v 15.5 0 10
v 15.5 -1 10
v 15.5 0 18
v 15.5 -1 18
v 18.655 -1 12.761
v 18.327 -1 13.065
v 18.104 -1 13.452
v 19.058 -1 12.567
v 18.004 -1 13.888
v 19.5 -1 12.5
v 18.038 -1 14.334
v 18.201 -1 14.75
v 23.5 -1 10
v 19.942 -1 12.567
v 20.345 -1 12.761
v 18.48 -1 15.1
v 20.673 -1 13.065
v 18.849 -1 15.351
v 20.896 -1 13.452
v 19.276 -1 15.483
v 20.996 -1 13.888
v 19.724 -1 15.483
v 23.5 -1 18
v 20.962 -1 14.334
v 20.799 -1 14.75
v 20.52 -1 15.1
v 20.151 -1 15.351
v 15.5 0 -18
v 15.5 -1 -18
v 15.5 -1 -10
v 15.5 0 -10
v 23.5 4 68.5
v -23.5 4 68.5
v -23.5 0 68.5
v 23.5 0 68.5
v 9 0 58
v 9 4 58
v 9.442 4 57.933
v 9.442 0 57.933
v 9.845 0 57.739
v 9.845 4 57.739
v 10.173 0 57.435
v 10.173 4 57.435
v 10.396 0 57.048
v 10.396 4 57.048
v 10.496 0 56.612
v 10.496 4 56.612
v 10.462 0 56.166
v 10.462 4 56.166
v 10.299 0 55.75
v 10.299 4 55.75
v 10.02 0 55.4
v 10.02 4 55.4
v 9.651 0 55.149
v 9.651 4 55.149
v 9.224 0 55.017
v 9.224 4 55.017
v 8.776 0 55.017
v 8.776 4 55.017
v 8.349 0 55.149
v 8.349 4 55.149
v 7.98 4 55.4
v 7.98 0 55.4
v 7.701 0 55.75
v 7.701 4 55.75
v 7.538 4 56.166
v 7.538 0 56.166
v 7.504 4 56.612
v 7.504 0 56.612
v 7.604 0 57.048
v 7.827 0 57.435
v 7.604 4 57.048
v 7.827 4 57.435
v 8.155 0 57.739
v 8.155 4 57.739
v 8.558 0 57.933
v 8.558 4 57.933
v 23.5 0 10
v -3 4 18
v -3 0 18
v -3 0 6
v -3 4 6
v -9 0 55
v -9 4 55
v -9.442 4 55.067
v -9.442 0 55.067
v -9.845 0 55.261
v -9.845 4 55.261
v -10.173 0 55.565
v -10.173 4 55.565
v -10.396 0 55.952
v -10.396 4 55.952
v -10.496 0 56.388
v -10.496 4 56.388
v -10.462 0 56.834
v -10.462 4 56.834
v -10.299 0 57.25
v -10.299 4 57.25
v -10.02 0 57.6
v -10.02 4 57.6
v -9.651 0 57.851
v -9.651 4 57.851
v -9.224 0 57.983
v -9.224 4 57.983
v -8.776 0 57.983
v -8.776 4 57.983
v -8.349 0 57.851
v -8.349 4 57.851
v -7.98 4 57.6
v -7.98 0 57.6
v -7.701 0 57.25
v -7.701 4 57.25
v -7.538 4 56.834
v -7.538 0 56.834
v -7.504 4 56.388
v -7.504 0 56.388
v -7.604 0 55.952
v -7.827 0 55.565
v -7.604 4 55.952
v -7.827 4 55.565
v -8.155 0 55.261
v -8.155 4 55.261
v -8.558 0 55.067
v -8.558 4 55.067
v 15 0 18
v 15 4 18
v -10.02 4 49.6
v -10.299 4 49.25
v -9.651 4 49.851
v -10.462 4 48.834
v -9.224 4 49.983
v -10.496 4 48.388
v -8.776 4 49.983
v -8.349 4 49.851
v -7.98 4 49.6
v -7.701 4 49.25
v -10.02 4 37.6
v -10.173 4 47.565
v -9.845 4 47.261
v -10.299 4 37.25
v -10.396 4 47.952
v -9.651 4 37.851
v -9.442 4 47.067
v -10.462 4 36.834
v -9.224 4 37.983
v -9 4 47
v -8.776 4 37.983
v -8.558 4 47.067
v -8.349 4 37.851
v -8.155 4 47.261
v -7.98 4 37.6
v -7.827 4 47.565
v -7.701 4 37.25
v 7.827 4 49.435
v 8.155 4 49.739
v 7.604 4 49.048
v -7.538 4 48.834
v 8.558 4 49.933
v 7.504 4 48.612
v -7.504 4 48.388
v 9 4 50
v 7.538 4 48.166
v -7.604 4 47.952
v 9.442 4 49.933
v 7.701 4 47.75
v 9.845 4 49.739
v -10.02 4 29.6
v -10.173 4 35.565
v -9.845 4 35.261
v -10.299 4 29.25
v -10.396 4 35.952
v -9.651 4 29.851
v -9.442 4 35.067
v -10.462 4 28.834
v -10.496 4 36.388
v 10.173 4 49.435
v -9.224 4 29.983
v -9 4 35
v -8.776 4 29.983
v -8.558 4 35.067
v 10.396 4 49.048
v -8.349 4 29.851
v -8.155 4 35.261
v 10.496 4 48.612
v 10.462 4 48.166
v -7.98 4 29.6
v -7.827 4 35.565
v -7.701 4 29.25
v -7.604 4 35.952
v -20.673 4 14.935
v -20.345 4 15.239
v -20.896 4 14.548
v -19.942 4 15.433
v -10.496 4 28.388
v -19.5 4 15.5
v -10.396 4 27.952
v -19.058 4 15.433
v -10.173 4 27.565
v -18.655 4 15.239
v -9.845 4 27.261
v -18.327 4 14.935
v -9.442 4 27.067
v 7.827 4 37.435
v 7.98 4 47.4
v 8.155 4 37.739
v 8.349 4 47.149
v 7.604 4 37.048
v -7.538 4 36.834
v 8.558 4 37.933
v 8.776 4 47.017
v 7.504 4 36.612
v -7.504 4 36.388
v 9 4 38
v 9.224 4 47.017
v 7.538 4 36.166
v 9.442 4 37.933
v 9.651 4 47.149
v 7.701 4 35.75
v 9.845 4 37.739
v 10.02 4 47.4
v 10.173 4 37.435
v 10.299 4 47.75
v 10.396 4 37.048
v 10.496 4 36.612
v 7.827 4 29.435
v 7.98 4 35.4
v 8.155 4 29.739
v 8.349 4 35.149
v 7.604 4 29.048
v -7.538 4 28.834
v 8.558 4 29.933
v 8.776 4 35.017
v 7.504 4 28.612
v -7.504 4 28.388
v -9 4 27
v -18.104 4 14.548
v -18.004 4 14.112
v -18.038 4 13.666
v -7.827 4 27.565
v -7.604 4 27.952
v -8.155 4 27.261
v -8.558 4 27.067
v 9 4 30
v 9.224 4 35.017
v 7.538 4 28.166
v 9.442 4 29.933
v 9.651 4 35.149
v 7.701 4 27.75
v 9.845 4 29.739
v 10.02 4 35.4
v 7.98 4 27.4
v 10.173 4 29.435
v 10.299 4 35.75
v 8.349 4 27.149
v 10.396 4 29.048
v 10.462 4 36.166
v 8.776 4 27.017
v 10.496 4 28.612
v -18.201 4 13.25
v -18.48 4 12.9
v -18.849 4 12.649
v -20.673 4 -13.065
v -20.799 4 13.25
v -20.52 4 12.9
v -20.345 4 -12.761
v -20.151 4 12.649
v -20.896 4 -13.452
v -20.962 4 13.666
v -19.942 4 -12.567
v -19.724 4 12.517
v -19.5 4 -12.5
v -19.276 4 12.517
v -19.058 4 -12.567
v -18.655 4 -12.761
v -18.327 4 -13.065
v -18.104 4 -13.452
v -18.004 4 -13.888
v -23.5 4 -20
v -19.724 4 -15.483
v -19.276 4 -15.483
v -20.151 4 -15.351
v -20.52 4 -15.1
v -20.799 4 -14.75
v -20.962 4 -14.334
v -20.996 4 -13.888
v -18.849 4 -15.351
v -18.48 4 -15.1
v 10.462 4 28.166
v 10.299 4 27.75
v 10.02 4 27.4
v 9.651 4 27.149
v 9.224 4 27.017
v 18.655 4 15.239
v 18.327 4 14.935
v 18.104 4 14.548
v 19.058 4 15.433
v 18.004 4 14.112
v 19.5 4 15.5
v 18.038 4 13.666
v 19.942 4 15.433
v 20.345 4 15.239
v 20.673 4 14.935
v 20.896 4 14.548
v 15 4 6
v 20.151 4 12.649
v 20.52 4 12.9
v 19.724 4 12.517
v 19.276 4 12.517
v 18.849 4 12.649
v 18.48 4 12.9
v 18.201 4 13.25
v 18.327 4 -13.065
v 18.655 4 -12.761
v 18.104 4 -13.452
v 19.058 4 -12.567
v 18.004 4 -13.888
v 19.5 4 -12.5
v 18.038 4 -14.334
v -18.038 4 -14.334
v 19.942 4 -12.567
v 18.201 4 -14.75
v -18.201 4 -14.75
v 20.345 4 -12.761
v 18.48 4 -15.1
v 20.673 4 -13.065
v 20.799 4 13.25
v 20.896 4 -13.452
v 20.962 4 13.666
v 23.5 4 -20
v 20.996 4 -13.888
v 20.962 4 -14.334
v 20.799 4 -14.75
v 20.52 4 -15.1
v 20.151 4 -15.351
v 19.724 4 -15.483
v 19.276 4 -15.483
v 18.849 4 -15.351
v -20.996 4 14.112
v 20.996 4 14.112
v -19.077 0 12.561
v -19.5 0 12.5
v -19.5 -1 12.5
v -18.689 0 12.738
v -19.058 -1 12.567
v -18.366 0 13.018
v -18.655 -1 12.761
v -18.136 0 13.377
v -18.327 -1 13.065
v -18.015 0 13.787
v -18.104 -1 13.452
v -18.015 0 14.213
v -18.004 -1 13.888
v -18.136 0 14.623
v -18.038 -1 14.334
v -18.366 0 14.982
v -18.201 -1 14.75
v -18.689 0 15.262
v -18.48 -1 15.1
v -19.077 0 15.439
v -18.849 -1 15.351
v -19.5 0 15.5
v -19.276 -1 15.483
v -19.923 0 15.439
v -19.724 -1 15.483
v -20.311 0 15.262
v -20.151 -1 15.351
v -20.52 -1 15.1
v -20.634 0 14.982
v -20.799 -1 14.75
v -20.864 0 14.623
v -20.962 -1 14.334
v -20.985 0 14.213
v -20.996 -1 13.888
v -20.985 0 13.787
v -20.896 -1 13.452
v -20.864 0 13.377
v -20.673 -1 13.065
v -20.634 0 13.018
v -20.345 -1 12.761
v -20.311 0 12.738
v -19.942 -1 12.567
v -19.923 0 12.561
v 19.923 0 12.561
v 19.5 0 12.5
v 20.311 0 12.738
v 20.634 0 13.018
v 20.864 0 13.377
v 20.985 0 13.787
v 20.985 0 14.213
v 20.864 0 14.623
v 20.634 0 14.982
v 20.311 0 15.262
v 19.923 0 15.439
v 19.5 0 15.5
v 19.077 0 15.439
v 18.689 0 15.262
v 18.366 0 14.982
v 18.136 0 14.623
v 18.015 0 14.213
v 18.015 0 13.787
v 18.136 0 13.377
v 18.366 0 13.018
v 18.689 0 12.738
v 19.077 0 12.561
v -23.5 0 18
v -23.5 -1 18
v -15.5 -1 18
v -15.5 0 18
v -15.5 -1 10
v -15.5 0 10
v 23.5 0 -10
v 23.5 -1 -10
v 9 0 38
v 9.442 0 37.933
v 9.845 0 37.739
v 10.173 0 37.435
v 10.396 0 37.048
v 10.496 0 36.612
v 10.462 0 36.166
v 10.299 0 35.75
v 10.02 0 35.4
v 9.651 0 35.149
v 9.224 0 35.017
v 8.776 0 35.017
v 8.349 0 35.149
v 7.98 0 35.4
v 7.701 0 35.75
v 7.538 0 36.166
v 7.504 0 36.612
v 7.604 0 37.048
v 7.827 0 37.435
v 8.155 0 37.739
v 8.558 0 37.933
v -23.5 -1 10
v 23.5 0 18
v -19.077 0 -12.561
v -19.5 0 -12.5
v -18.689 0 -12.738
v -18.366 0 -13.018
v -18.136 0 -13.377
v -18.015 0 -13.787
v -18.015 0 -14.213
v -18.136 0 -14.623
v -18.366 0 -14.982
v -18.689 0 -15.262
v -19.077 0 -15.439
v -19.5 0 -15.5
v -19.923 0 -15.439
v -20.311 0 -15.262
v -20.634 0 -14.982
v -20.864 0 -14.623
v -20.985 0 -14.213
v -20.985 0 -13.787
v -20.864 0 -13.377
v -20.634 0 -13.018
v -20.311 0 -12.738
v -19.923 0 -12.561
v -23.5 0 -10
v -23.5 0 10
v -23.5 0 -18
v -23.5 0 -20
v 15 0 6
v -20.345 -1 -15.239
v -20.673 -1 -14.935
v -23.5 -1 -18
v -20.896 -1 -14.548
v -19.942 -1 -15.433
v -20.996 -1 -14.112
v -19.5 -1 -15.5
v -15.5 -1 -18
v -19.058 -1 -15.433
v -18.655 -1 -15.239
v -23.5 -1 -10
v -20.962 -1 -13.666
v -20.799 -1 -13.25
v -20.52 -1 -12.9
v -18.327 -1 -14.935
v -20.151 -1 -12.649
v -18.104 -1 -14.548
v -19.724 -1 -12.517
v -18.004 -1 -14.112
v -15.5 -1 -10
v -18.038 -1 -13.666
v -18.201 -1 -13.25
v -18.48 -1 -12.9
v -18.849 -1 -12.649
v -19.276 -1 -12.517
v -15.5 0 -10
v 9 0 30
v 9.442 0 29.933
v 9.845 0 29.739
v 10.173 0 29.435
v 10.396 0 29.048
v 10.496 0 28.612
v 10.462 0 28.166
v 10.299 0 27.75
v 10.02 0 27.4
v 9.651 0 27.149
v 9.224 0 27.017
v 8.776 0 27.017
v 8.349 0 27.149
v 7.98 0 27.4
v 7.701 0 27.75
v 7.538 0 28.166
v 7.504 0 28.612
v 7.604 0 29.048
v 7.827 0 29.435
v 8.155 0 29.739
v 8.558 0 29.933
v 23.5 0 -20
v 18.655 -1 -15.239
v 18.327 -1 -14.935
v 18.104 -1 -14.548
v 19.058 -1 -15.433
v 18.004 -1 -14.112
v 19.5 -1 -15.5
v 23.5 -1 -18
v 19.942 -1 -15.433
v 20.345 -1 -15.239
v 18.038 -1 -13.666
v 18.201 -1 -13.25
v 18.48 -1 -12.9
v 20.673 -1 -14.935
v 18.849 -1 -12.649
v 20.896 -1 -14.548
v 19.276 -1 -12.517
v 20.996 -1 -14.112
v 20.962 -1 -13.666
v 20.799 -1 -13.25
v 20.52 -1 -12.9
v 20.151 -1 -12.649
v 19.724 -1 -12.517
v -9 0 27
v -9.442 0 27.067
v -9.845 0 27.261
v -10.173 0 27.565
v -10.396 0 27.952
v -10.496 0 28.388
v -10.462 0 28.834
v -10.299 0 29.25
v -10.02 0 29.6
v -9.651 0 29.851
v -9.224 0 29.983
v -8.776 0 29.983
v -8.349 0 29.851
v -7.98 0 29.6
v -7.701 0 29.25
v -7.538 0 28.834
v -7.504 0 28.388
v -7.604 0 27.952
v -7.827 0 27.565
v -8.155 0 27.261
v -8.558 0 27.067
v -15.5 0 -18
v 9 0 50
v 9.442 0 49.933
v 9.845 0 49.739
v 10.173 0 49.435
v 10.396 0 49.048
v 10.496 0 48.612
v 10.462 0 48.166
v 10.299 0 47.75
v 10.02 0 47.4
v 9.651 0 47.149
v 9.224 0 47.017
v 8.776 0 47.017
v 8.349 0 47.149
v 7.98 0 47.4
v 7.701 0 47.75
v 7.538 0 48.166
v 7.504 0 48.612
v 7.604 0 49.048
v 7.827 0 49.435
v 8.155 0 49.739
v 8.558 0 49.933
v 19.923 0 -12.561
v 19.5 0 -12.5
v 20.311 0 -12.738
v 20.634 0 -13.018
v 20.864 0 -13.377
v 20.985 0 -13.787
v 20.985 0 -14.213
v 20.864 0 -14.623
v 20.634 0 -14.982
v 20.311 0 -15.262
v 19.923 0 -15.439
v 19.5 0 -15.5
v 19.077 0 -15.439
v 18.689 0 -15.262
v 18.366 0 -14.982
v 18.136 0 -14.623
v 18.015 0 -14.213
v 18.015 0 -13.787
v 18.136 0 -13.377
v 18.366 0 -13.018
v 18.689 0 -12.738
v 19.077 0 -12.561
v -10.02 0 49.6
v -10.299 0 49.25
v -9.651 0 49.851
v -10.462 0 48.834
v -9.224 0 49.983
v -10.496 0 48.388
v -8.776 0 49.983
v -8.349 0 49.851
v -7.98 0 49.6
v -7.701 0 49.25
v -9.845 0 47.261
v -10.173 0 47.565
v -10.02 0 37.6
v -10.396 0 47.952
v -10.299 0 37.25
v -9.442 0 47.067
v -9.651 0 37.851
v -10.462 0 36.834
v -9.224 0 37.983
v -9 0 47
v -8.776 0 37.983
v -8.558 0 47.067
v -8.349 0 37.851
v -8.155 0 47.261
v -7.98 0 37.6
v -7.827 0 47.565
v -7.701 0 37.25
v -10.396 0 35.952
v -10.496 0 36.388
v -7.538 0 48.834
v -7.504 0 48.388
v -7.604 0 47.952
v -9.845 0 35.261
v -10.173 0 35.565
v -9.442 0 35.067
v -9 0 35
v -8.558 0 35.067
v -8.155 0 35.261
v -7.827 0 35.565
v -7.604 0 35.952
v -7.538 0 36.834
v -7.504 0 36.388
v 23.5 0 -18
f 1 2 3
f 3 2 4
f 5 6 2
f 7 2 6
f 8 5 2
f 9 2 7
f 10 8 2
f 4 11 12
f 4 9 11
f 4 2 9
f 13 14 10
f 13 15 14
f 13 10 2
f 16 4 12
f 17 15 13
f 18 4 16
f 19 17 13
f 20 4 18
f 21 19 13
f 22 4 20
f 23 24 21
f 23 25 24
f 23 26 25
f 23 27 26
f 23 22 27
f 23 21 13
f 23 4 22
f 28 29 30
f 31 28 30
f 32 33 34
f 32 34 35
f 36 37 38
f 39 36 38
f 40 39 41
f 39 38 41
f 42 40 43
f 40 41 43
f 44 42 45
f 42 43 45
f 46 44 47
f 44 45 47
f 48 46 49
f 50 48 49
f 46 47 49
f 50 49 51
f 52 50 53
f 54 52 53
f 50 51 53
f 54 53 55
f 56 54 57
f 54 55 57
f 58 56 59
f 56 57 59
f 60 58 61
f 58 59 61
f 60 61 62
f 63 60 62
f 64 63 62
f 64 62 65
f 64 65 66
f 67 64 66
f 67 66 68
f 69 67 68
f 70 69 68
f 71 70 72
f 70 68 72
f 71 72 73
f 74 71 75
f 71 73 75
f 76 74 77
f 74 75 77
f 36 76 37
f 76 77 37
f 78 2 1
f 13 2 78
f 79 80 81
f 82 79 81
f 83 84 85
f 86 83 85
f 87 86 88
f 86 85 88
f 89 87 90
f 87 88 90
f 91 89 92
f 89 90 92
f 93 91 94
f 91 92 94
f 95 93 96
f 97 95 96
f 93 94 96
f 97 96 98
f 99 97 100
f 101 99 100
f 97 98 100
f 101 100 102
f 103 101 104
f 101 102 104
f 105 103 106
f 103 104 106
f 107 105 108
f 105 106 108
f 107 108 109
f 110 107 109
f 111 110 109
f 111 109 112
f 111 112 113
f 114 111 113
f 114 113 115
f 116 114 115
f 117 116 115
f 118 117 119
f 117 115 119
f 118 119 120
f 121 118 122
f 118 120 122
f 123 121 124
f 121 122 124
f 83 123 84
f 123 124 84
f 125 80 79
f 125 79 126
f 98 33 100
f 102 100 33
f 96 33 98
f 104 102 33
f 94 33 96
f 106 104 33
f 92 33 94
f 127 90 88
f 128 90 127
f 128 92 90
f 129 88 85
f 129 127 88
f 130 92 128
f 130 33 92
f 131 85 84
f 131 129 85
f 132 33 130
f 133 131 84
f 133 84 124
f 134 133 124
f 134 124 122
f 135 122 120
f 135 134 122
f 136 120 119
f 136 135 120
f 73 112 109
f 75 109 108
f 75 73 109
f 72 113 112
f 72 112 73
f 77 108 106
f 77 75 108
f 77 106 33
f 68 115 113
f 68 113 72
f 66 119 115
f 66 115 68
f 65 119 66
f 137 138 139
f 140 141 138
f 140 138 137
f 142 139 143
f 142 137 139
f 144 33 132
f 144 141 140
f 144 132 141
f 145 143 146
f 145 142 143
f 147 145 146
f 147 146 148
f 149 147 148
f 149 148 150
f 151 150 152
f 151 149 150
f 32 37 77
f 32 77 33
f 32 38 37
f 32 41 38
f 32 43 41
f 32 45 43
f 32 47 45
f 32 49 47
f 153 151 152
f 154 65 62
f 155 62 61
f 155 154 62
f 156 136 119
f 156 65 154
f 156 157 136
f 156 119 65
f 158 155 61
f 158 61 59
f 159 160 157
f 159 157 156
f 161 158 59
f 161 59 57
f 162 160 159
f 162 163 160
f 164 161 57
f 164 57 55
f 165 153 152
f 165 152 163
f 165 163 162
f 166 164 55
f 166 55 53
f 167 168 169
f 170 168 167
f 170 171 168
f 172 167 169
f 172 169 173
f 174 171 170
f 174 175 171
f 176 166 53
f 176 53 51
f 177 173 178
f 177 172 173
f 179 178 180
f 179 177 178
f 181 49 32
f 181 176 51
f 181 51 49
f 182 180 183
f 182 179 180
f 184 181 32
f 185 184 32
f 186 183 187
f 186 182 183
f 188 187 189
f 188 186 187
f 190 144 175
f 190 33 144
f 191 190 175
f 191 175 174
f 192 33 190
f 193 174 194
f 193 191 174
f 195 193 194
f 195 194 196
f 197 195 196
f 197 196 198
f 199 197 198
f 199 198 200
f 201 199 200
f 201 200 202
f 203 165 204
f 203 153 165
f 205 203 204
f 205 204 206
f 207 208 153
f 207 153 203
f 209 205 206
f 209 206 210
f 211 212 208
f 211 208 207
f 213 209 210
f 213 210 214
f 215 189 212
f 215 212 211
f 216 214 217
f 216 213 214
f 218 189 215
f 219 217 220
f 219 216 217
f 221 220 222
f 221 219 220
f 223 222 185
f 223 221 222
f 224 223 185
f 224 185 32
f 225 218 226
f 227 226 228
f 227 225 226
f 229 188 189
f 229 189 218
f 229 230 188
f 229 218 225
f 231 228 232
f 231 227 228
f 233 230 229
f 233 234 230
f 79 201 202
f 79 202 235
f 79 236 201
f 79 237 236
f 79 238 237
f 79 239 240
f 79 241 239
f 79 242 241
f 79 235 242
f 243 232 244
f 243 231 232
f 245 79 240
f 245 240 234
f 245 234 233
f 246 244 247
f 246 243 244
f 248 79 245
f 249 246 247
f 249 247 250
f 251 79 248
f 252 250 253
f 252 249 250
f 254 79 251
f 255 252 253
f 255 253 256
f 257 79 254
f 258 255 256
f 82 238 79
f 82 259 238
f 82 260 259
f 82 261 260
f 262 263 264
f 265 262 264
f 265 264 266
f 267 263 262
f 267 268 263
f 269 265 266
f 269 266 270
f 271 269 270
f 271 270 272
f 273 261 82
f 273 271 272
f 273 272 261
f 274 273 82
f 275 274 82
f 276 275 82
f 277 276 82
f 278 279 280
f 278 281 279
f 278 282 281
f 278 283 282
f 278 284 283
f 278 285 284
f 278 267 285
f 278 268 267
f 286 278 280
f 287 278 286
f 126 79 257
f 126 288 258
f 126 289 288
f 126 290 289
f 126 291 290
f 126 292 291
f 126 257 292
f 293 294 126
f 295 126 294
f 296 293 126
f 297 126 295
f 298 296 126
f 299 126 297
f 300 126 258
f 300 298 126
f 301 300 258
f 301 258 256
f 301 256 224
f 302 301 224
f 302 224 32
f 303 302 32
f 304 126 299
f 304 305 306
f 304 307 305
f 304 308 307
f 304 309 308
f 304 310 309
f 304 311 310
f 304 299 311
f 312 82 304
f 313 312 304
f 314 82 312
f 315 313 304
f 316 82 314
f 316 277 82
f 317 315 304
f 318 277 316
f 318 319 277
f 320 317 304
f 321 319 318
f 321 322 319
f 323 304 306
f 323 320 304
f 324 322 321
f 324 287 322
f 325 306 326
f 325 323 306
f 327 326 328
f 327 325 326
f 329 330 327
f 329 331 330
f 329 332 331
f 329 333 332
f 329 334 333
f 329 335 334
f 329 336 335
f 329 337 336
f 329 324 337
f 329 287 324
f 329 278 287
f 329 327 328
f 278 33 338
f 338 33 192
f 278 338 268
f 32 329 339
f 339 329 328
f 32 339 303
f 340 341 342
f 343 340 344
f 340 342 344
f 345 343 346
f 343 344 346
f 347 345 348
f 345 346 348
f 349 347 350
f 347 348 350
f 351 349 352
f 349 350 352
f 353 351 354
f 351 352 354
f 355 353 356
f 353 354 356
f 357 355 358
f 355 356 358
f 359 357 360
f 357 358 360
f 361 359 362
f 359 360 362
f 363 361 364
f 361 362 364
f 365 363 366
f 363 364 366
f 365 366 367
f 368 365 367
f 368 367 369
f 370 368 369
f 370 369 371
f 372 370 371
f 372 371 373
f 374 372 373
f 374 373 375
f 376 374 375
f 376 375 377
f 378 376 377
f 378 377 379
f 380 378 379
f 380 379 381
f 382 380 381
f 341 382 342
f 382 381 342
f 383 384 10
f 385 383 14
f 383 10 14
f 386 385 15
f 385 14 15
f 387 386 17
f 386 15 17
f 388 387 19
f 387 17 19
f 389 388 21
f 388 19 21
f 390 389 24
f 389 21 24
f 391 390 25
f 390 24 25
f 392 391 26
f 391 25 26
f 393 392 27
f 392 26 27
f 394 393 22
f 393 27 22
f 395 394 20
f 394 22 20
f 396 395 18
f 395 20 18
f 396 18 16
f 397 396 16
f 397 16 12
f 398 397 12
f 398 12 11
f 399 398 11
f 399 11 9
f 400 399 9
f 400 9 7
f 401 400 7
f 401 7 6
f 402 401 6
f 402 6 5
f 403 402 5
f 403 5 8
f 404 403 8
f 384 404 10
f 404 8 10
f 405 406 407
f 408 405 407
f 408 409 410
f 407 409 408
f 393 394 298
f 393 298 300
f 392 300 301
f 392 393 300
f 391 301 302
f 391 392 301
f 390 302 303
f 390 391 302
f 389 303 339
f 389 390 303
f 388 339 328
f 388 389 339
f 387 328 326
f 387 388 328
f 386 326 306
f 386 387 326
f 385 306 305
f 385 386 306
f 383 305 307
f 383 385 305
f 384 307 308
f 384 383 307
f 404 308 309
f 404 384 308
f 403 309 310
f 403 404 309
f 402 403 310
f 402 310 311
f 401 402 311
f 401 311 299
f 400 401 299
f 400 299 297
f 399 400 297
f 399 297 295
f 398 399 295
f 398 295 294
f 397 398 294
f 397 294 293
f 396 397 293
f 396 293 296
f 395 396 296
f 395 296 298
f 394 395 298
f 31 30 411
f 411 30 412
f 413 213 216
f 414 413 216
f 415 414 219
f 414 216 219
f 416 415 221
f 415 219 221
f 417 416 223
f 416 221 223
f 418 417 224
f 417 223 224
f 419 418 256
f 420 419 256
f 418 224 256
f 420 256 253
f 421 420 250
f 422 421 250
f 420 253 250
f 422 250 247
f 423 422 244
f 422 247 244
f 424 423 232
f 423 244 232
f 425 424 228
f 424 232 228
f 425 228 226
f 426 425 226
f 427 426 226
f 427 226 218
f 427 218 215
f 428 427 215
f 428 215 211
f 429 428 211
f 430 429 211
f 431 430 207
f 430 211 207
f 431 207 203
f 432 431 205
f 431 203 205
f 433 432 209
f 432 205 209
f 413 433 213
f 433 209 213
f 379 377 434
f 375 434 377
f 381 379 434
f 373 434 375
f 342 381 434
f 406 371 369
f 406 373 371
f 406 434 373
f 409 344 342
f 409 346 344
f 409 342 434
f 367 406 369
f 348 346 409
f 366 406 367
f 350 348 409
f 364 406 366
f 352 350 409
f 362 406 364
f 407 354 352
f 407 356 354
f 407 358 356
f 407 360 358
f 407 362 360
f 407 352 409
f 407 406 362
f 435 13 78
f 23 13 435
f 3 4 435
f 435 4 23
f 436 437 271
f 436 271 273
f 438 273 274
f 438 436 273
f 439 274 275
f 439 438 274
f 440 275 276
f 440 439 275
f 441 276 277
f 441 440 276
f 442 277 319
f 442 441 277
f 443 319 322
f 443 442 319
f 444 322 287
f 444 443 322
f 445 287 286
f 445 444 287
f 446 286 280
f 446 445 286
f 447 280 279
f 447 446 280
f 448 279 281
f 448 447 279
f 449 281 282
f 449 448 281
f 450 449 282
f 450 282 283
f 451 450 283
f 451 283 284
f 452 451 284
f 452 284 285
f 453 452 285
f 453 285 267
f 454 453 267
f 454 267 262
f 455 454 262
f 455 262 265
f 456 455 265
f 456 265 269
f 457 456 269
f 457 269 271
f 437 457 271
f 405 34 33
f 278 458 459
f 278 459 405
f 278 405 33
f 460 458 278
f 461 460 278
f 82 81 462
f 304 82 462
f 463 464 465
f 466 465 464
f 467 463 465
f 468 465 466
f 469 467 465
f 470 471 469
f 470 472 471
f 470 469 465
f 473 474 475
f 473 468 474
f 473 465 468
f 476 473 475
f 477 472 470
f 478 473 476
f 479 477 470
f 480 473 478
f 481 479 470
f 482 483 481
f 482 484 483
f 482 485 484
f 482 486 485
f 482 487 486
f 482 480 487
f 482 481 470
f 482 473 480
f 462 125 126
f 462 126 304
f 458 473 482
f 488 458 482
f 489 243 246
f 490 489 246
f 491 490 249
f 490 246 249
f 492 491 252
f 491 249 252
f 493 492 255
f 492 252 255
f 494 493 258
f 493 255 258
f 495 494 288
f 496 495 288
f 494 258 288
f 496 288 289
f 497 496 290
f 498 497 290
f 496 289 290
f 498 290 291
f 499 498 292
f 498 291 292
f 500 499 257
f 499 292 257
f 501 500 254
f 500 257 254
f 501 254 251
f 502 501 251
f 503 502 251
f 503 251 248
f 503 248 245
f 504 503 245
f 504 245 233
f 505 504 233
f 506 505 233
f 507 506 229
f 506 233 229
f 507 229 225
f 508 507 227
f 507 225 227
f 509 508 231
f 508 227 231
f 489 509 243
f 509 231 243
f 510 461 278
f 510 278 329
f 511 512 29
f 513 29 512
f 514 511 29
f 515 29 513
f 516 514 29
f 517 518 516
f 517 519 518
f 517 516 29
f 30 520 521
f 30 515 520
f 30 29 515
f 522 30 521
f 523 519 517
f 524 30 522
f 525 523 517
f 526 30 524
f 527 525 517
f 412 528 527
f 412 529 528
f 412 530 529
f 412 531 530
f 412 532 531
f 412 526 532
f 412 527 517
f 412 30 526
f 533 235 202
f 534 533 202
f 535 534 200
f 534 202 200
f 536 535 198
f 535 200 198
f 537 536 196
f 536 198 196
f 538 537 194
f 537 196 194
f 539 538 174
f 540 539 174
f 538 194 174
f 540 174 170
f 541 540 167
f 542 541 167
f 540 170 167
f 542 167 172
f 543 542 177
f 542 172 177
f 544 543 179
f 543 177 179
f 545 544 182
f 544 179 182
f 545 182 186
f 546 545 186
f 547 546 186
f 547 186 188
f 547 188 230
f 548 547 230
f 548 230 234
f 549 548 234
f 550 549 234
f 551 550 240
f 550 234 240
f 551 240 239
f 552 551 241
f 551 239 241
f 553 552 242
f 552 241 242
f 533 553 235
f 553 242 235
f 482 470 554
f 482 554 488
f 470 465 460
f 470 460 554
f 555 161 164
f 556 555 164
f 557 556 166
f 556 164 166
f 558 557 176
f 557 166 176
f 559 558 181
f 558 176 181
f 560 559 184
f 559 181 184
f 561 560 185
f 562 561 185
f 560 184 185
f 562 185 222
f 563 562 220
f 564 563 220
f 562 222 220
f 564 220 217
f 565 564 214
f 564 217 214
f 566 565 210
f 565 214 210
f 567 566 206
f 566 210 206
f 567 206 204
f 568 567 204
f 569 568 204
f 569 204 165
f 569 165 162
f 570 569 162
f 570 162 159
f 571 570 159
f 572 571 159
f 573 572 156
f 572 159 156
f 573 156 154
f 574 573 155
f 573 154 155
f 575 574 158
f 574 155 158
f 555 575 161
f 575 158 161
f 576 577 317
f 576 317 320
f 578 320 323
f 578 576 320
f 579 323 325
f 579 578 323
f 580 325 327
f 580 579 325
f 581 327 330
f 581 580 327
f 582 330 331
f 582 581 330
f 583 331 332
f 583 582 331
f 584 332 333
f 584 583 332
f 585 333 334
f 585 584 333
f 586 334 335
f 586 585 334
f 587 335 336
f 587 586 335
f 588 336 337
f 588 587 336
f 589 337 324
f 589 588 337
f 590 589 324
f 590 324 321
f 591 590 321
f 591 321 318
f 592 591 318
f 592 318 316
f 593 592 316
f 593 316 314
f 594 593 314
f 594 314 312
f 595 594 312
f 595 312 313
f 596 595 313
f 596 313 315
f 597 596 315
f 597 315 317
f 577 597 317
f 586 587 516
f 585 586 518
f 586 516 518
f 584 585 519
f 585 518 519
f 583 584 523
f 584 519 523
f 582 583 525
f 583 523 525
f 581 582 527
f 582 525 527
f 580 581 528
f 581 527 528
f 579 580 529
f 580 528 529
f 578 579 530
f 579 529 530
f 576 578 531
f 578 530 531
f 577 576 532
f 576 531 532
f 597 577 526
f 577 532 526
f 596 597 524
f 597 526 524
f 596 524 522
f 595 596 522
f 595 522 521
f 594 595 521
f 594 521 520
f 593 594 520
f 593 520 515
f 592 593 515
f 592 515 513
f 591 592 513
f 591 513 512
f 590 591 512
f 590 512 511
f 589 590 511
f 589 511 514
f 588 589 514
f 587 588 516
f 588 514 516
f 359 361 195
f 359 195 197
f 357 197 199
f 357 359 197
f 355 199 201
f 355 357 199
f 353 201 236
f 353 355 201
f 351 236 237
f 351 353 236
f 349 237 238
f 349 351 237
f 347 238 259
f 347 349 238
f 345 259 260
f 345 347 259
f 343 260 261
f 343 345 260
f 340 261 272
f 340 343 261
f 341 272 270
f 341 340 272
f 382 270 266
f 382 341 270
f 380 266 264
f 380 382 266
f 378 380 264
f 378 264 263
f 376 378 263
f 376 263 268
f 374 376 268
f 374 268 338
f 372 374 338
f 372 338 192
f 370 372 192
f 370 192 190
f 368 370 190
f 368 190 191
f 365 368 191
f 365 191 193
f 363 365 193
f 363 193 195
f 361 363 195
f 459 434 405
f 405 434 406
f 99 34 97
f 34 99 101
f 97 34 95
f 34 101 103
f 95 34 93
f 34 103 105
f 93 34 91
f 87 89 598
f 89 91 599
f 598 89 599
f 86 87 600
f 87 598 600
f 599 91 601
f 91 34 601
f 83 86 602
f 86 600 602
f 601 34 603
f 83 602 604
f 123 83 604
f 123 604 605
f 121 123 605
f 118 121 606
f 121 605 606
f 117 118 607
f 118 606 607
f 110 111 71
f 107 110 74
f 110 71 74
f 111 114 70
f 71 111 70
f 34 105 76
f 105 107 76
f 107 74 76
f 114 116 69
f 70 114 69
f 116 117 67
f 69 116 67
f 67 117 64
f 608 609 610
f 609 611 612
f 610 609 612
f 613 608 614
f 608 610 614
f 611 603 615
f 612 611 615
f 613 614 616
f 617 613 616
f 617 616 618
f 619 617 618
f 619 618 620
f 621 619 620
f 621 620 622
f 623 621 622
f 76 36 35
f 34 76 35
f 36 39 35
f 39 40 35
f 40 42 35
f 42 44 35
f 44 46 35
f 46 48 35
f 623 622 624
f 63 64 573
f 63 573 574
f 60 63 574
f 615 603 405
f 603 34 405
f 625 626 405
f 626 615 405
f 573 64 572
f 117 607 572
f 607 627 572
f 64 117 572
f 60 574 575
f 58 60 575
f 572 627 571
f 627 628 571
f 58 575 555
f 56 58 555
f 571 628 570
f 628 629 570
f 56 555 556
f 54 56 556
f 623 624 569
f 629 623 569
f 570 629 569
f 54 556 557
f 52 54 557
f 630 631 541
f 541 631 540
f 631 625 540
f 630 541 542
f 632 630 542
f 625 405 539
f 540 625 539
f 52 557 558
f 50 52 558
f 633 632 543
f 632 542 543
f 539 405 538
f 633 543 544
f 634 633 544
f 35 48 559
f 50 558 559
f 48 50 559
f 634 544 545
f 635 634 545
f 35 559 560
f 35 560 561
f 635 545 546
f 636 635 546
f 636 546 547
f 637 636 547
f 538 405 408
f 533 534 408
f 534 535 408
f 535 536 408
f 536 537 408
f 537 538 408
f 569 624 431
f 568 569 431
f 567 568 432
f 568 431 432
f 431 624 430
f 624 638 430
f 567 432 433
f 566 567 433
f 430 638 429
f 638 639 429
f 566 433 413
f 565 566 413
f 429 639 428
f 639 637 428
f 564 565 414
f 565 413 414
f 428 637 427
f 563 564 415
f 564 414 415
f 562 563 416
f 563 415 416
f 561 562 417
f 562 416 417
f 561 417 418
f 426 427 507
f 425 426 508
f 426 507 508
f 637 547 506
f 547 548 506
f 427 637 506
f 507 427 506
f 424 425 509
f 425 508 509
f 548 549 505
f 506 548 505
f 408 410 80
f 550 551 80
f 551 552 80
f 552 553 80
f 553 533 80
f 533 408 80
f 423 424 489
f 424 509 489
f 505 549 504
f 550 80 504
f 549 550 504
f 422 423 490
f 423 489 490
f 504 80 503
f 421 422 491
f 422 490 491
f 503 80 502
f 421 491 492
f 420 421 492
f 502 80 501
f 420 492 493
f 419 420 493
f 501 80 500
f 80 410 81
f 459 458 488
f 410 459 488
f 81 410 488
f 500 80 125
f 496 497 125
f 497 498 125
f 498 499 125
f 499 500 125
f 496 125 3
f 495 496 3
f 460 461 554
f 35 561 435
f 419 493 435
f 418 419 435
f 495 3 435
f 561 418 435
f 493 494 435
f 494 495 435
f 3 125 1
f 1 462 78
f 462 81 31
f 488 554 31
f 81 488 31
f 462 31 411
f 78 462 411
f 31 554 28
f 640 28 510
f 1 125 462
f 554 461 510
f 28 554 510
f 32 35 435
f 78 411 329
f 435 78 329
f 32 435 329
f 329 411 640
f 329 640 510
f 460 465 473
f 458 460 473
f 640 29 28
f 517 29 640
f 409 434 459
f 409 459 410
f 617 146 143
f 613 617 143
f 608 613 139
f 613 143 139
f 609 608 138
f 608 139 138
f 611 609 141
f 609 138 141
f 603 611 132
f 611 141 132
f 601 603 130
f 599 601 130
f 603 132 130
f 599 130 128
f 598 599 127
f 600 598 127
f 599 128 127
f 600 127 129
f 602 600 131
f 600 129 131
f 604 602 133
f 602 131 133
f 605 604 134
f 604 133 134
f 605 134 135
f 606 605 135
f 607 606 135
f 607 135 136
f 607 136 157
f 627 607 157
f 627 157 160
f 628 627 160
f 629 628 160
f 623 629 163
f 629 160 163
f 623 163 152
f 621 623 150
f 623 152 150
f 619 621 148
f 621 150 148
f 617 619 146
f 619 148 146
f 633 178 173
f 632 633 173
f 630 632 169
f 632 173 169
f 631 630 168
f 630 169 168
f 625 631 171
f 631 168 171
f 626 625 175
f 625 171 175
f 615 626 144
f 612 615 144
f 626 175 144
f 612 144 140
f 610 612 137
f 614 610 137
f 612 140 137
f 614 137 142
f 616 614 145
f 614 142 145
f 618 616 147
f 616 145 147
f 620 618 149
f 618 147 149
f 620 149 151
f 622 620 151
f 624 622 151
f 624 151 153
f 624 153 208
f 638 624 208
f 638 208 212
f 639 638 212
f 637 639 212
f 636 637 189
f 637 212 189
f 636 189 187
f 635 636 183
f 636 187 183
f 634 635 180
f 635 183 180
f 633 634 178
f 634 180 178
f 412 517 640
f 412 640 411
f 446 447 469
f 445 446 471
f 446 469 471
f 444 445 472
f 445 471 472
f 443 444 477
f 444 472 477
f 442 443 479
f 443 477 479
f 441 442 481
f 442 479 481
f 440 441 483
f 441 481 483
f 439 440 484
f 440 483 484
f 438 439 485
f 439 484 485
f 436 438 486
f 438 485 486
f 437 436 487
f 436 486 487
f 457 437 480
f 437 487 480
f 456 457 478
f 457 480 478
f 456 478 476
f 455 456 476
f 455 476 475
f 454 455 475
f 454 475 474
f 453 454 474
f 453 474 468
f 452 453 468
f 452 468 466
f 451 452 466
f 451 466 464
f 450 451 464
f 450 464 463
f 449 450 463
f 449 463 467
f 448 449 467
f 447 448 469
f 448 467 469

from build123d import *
from build123d.topology import SkipClean

# Parameters (mm, degrees)
SKETCH_1_W          = 47
SKETCH_1_H          = 93.5
SKETCH_1_R          = 1.5
SKETCH_1_W_2        = 18
SKETCH_1_H_2        = 12
EXTRUDE_1_DEPTH     = 4
EXTRUDE_START       = 1
SKETCH_3_W          = 8
SKETCH_3_H          = 8
SKETCH_3_R          = 1.5
EXTRUDE_2_DEPTH     = 1
SKETCH_4_R          = 1.5
SKETCH_4_W          = 47
SKETCH_4_H          = 5
CUT_EXTRUDE_2_DEPTH = 4


with BuildPart() as part:
    # 草图1 → 凸台-拉伸1 (new body)
    with BuildSketch(Plane(origin=(0, 0, 0), x_dir=(1, 0, 0), z_dir=(0, 1, 0))):
        with Locations((0, -26.75)):
            Rectangle(SKETCH_1_W, SKETCH_1_H)
        with Locations(Location((-19.5, -14, 0), (0, 0, 270))):
            Circle(SKETCH_1_R, mode=Mode.SUBTRACT)
        with Locations((6, -12)):
            Rectangle(SKETCH_1_W_2, SKETCH_1_H_2, mode=Mode.SUBTRACT)
        with Locations(Location((-19.5, 14, 0), (0, 0, 270))):
            Circle(SKETCH_1_R, mode=Mode.SUBTRACT)
        with Locations(Location((19.5, -14, 0), (0, 0, 270))):
            Circle(SKETCH_1_R, mode=Mode.SUBTRACT)
        with Locations(Location((19.5, 14, 0), (0, 0, 270))):
            Circle(SKETCH_1_R, mode=Mode.SUBTRACT)
    extrude(amount=EXTRUDE_1_DEPTH)

    # 草图3 → 凸台-拉伸2 (add)
    # profile 1 of 4: a face of its own
    with SkipClean():  # the faces are left unmerged after this step: merging them gives an invalid solid
        with BuildSketch(Plane.XZ.offset(EXTRUDE_START)):
            with Locations((19.5, -14)):
                Rectangle(SKETCH_3_W, SKETCH_3_H)
            with Locations(Location((19.5, -14, 0), (0, 0, 270))):
                Circle(SKETCH_3_R, mode=Mode.SUBTRACT)
        # profile 2 of 4: a face of its own
        with BuildSketch(Plane.XZ.offset(EXTRUDE_START)):
            with Locations((19.5, 14)):
                Rectangle(SKETCH_3_W, SKETCH_3_H)
            with Locations(Location((19.5, 14, 0), (0, 0, 270))):
                Circle(SKETCH_3_R, mode=Mode.SUBTRACT)
        # profile 3 of 4: a face of its own
        with BuildSketch(Plane.XZ.offset(EXTRUDE_START)):
            with Locations((-19.5, -14)):
                Rectangle(SKETCH_3_W, SKETCH_3_H)
            with Locations(Location((-19.5, -14, 0), (0, 0, 270))):
                Circle(SKETCH_3_R, mode=Mode.SUBTRACT)
        # profile 4 of 4: a face of its own
        with BuildSketch(Plane.XZ.offset(EXTRUDE_START)):
            with Locations((-19.5, 14)):
                Rectangle(SKETCH_3_W, SKETCH_3_H)
            with Locations(Location((-19.5, 14, 0), (0, 0, 270))):
                Circle(SKETCH_3_R, mode=Mode.SUBTRACT)
        extrude(amount=-EXTRUDE_2_DEPTH)

    # 草图4 → 切除-拉伸2 (cut)
    with SkipClean():  # the faces are left unmerged after this step: merging them gives an invalid solid
        with BuildSketch(Plane(origin=(0, 4, 0), x_dir=(1, 0, 0), z_dir=(0, 1, 0))):
            with Locations(Location((9, -28.5, 0), (0, 0, 270))):
                Circle(SKETCH_4_R)
            with Locations(Location((9, -48.5, 0), (0, 0, 270))):
                Circle(SKETCH_4_R)
            with Locations(Location((-9, -48.5, 0), (0, 0, 90))):
                Circle(SKETCH_4_R)
            with Locations(Location((-9, -28.5, 0), (0, 0, 90))):
                Circle(SKETCH_4_R)
            with Locations(Location((-9, -36.5, 0), (0, 0, 90))):
                Circle(SKETCH_4_R)
            with Locations(Location((9, -36.5, 0), (0, 0, 270))):
                Circle(SKETCH_4_R)
            with Locations(Location((9, -56.5, 0), (0, 0, 270))):
                Circle(SKETCH_4_R)
            with Locations(Location((-9, -56.5, 0), (0, 0, 90))):
                Circle(SKETCH_4_R)
            with Locations((0, -71)):
                Rectangle(SKETCH_4_W, SKETCH_4_H)
        extrude(amount=-CUT_EXTRUDE_2_DEPTH, mode=Mode.SUBTRACT)


solid = part.part
